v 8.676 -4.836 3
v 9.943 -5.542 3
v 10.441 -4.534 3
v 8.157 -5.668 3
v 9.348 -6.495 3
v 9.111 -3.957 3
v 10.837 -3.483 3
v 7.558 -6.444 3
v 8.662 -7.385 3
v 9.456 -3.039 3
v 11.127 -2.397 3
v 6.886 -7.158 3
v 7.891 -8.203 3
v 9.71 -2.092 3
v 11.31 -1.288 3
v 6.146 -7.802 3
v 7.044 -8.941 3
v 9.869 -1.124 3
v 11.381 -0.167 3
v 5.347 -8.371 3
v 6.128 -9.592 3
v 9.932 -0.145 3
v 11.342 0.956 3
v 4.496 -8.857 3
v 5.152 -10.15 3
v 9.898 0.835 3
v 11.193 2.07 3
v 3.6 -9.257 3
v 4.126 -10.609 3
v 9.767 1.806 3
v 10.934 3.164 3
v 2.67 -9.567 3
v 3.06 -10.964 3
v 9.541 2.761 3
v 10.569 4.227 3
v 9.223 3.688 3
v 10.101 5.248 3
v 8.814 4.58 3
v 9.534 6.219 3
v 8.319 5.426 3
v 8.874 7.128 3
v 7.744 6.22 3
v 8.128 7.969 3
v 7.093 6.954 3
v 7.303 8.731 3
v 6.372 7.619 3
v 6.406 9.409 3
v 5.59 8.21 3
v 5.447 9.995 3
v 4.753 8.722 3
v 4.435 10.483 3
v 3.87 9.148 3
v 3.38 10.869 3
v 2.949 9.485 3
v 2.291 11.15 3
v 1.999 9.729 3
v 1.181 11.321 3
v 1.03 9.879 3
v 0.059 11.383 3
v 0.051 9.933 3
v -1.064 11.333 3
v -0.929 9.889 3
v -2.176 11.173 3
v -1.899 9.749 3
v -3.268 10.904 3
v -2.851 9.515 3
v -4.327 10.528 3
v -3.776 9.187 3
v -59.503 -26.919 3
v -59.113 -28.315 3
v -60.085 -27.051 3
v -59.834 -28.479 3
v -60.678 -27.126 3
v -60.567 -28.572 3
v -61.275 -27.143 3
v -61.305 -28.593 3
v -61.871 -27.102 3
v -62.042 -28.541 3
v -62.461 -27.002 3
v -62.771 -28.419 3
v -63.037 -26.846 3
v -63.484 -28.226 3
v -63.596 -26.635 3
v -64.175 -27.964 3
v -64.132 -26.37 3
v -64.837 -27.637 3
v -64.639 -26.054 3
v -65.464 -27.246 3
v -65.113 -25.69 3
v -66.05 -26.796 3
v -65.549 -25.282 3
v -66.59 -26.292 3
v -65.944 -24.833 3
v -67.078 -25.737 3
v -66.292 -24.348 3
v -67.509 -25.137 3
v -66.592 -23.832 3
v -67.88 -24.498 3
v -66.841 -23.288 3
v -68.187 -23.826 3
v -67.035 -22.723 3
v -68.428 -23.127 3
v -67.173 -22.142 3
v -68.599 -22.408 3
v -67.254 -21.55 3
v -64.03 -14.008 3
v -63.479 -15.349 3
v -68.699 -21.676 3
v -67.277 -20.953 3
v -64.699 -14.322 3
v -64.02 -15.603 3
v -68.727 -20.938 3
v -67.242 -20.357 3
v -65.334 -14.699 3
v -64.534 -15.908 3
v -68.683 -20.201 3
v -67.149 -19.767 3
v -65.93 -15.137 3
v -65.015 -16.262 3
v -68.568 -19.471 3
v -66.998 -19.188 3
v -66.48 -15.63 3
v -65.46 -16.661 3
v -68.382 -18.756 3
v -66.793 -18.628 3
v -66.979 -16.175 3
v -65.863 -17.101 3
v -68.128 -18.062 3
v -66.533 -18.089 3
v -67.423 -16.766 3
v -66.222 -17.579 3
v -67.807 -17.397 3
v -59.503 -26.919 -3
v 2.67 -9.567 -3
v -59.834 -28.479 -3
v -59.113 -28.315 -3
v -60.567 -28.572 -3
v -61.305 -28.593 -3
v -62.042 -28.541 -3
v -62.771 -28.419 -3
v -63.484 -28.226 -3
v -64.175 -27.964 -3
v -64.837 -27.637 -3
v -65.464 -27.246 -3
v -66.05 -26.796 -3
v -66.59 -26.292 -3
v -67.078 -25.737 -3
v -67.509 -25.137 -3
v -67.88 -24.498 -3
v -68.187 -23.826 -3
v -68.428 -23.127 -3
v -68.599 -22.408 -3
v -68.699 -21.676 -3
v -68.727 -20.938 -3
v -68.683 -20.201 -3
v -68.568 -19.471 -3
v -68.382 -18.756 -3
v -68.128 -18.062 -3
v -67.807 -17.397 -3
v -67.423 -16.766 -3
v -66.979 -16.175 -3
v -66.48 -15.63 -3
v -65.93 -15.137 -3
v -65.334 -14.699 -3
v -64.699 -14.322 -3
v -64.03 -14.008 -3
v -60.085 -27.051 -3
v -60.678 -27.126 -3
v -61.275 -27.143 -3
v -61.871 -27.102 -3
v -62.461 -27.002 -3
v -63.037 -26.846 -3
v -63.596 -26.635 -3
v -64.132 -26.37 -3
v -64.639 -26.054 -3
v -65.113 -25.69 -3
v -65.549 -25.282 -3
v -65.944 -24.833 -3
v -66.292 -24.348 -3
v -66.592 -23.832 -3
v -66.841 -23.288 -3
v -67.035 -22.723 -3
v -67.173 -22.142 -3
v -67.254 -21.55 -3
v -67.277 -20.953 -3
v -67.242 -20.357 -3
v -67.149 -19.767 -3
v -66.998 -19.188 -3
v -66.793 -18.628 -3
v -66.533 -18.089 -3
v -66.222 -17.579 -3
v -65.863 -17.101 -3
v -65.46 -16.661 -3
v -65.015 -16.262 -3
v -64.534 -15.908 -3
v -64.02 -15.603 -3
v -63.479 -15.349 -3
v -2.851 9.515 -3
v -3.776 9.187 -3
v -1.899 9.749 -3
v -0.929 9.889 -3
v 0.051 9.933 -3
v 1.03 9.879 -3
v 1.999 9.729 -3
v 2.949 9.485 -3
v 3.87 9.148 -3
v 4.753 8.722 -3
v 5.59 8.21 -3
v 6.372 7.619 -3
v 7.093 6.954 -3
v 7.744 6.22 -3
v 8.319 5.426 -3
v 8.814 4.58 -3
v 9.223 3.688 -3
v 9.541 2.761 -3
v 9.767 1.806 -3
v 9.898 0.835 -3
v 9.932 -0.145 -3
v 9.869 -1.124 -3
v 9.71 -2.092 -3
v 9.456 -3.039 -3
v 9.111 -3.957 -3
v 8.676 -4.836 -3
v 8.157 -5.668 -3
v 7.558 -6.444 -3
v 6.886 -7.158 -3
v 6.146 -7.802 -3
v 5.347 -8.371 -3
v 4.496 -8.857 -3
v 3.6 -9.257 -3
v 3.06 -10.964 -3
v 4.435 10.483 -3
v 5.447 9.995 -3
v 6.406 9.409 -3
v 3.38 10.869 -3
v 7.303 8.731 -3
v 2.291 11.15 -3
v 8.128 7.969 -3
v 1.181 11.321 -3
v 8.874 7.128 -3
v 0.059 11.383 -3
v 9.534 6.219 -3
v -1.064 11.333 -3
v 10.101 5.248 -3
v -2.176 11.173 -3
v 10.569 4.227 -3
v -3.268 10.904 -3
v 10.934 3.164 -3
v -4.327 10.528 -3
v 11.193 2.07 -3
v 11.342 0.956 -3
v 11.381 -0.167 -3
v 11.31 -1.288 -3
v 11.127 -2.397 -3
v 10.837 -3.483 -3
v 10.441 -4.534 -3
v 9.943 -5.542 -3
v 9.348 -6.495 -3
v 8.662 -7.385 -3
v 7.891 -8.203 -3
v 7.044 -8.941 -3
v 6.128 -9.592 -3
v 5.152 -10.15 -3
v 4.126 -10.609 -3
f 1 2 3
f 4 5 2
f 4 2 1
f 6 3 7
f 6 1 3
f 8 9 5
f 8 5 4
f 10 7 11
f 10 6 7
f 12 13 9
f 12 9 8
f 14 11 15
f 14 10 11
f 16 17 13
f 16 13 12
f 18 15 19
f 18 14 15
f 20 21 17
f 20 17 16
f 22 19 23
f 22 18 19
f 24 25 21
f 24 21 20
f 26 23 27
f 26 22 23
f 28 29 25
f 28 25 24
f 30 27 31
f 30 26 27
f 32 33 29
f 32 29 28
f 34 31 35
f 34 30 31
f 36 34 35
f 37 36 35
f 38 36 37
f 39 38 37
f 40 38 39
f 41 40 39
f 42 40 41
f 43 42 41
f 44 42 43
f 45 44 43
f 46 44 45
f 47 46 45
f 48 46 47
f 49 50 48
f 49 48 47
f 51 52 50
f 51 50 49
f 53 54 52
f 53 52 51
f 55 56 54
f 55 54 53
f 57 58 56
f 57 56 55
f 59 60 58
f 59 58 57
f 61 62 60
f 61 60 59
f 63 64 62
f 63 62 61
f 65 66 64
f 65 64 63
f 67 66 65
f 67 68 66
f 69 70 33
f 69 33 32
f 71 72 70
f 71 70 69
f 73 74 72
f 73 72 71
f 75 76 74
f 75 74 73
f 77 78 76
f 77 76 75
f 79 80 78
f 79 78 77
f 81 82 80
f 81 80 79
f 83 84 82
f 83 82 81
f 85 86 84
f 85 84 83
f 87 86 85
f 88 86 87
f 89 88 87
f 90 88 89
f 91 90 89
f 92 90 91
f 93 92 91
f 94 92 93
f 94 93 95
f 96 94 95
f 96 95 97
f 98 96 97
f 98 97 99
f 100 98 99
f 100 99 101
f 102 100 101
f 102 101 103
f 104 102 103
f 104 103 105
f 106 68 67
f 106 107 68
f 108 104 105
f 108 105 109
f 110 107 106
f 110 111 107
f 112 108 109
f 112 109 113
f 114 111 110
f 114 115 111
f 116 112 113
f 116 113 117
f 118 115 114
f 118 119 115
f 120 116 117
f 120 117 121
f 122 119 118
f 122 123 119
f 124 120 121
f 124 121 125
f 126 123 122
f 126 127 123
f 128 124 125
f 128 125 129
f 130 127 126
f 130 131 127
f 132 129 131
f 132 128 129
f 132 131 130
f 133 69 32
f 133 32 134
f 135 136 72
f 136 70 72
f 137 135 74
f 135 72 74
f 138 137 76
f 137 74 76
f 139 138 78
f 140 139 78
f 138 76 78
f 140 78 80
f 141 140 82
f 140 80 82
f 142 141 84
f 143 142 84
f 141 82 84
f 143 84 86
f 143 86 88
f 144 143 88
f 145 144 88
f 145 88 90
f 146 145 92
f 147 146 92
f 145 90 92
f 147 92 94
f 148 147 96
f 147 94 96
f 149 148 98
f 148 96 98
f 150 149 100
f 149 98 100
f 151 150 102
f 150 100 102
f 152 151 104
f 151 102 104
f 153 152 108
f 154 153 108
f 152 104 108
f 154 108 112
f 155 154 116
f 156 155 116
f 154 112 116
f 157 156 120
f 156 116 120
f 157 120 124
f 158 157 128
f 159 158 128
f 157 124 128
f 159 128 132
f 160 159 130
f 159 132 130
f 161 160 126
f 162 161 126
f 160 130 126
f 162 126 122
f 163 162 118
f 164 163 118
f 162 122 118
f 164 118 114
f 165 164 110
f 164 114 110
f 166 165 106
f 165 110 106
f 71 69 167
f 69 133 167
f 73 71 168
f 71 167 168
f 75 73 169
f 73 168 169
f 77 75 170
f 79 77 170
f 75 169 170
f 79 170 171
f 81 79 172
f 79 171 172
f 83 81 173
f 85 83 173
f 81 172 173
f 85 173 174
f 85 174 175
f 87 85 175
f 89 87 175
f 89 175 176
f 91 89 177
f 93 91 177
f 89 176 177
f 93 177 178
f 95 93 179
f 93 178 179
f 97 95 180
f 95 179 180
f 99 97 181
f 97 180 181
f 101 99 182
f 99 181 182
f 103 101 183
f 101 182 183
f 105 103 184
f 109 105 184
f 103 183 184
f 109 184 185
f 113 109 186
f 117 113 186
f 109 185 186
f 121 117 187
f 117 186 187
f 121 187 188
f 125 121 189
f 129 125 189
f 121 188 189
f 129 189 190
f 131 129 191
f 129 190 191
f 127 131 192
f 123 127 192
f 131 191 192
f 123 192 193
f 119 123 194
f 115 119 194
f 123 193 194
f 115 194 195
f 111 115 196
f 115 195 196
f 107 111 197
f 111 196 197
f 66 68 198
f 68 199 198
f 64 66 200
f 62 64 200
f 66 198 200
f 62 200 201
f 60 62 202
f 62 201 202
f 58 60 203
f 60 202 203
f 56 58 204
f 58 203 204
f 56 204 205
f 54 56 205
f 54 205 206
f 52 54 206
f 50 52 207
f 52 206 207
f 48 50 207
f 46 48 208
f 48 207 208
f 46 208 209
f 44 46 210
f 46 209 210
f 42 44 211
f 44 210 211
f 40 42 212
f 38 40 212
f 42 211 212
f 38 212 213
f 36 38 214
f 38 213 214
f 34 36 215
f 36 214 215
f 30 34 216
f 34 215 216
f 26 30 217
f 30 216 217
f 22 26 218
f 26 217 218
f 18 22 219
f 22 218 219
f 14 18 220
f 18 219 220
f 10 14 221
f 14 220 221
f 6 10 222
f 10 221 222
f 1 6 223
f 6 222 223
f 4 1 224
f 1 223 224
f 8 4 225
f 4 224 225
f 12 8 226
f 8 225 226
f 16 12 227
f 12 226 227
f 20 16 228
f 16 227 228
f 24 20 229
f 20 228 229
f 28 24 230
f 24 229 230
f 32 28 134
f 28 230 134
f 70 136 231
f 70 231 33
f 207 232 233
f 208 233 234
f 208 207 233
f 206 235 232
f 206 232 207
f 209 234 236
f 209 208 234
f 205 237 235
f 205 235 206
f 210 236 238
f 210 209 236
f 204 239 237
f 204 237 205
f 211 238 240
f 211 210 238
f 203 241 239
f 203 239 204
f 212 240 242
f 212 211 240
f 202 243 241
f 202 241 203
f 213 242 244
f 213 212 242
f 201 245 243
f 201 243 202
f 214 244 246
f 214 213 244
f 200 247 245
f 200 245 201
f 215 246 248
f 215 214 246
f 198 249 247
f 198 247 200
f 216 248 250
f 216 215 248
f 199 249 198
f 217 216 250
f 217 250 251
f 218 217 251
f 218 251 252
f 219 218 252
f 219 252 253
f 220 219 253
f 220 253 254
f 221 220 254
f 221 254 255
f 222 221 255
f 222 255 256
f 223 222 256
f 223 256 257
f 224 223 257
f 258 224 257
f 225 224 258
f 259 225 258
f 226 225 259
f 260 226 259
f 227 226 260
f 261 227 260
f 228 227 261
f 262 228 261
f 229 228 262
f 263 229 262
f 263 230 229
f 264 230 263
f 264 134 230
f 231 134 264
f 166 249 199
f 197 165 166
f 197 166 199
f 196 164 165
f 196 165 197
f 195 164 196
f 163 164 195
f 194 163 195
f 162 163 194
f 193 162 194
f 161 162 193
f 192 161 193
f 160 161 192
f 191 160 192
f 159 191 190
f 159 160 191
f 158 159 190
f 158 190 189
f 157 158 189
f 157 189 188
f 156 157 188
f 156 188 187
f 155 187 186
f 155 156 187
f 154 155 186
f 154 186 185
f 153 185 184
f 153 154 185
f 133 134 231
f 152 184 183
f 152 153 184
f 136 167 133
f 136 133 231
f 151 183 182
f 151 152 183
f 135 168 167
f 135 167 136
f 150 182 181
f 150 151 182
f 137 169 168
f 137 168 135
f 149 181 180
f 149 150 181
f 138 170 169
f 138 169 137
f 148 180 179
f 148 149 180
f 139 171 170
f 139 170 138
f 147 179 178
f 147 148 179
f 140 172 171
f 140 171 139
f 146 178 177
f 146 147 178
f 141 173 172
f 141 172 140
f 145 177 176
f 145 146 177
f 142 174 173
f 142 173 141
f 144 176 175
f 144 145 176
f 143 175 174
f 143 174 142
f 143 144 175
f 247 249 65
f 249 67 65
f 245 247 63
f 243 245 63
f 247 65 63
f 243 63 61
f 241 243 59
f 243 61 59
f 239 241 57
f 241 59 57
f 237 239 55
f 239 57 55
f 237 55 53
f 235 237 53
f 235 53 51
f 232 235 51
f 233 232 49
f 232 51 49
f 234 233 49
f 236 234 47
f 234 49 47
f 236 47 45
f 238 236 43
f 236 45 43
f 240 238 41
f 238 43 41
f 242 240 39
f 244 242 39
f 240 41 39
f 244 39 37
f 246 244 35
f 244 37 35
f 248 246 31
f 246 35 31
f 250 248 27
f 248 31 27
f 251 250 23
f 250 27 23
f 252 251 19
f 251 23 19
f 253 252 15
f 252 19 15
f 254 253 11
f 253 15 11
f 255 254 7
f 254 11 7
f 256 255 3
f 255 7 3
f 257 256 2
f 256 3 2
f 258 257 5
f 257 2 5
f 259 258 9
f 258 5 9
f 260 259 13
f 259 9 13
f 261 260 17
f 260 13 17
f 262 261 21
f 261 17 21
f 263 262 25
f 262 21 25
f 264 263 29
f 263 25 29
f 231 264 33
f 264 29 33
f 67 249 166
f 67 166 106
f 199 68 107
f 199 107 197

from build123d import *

# Parameters (mm, degrees)
SKETCH3_W = 6
SKETCH3_H = 1.45


with BuildPart() as part:
    # Sweep1: sweep along a path in Sketch2
    with BuildLine(Plane.XY) as sweep1_path:
        Line((2.67002525, -9.567055565), (-59.502854179, -26.918596678))
        ThreePointArc((-59.502854179, -26.918596678), (-66.944770348, -23.008271135), (-63.479166051, -15.349136134))
        Line((-63.479166051, -15.349136134), (-3.775591162, 9.187083237))
        ThreePointArc((-3.775591162, 9.187083237), (9.393348687, 3.228403239), (2.67002525, -9.567055565))
    # Sketch3 → Sweep1 (sweep)
    with BuildSketch(Plane(origin=(-63.479166051, -15.349136134, 0), x_dir=(0, 0, -1), z_dir=(0.9249375405656244, 0.38011912087188415, 0))):
        with Locations((0, 0.725)):
            Rectangle(SKETCH3_W, SKETCH3_H)
    sweep(path=sweep1_path.line)


solid = part.part
